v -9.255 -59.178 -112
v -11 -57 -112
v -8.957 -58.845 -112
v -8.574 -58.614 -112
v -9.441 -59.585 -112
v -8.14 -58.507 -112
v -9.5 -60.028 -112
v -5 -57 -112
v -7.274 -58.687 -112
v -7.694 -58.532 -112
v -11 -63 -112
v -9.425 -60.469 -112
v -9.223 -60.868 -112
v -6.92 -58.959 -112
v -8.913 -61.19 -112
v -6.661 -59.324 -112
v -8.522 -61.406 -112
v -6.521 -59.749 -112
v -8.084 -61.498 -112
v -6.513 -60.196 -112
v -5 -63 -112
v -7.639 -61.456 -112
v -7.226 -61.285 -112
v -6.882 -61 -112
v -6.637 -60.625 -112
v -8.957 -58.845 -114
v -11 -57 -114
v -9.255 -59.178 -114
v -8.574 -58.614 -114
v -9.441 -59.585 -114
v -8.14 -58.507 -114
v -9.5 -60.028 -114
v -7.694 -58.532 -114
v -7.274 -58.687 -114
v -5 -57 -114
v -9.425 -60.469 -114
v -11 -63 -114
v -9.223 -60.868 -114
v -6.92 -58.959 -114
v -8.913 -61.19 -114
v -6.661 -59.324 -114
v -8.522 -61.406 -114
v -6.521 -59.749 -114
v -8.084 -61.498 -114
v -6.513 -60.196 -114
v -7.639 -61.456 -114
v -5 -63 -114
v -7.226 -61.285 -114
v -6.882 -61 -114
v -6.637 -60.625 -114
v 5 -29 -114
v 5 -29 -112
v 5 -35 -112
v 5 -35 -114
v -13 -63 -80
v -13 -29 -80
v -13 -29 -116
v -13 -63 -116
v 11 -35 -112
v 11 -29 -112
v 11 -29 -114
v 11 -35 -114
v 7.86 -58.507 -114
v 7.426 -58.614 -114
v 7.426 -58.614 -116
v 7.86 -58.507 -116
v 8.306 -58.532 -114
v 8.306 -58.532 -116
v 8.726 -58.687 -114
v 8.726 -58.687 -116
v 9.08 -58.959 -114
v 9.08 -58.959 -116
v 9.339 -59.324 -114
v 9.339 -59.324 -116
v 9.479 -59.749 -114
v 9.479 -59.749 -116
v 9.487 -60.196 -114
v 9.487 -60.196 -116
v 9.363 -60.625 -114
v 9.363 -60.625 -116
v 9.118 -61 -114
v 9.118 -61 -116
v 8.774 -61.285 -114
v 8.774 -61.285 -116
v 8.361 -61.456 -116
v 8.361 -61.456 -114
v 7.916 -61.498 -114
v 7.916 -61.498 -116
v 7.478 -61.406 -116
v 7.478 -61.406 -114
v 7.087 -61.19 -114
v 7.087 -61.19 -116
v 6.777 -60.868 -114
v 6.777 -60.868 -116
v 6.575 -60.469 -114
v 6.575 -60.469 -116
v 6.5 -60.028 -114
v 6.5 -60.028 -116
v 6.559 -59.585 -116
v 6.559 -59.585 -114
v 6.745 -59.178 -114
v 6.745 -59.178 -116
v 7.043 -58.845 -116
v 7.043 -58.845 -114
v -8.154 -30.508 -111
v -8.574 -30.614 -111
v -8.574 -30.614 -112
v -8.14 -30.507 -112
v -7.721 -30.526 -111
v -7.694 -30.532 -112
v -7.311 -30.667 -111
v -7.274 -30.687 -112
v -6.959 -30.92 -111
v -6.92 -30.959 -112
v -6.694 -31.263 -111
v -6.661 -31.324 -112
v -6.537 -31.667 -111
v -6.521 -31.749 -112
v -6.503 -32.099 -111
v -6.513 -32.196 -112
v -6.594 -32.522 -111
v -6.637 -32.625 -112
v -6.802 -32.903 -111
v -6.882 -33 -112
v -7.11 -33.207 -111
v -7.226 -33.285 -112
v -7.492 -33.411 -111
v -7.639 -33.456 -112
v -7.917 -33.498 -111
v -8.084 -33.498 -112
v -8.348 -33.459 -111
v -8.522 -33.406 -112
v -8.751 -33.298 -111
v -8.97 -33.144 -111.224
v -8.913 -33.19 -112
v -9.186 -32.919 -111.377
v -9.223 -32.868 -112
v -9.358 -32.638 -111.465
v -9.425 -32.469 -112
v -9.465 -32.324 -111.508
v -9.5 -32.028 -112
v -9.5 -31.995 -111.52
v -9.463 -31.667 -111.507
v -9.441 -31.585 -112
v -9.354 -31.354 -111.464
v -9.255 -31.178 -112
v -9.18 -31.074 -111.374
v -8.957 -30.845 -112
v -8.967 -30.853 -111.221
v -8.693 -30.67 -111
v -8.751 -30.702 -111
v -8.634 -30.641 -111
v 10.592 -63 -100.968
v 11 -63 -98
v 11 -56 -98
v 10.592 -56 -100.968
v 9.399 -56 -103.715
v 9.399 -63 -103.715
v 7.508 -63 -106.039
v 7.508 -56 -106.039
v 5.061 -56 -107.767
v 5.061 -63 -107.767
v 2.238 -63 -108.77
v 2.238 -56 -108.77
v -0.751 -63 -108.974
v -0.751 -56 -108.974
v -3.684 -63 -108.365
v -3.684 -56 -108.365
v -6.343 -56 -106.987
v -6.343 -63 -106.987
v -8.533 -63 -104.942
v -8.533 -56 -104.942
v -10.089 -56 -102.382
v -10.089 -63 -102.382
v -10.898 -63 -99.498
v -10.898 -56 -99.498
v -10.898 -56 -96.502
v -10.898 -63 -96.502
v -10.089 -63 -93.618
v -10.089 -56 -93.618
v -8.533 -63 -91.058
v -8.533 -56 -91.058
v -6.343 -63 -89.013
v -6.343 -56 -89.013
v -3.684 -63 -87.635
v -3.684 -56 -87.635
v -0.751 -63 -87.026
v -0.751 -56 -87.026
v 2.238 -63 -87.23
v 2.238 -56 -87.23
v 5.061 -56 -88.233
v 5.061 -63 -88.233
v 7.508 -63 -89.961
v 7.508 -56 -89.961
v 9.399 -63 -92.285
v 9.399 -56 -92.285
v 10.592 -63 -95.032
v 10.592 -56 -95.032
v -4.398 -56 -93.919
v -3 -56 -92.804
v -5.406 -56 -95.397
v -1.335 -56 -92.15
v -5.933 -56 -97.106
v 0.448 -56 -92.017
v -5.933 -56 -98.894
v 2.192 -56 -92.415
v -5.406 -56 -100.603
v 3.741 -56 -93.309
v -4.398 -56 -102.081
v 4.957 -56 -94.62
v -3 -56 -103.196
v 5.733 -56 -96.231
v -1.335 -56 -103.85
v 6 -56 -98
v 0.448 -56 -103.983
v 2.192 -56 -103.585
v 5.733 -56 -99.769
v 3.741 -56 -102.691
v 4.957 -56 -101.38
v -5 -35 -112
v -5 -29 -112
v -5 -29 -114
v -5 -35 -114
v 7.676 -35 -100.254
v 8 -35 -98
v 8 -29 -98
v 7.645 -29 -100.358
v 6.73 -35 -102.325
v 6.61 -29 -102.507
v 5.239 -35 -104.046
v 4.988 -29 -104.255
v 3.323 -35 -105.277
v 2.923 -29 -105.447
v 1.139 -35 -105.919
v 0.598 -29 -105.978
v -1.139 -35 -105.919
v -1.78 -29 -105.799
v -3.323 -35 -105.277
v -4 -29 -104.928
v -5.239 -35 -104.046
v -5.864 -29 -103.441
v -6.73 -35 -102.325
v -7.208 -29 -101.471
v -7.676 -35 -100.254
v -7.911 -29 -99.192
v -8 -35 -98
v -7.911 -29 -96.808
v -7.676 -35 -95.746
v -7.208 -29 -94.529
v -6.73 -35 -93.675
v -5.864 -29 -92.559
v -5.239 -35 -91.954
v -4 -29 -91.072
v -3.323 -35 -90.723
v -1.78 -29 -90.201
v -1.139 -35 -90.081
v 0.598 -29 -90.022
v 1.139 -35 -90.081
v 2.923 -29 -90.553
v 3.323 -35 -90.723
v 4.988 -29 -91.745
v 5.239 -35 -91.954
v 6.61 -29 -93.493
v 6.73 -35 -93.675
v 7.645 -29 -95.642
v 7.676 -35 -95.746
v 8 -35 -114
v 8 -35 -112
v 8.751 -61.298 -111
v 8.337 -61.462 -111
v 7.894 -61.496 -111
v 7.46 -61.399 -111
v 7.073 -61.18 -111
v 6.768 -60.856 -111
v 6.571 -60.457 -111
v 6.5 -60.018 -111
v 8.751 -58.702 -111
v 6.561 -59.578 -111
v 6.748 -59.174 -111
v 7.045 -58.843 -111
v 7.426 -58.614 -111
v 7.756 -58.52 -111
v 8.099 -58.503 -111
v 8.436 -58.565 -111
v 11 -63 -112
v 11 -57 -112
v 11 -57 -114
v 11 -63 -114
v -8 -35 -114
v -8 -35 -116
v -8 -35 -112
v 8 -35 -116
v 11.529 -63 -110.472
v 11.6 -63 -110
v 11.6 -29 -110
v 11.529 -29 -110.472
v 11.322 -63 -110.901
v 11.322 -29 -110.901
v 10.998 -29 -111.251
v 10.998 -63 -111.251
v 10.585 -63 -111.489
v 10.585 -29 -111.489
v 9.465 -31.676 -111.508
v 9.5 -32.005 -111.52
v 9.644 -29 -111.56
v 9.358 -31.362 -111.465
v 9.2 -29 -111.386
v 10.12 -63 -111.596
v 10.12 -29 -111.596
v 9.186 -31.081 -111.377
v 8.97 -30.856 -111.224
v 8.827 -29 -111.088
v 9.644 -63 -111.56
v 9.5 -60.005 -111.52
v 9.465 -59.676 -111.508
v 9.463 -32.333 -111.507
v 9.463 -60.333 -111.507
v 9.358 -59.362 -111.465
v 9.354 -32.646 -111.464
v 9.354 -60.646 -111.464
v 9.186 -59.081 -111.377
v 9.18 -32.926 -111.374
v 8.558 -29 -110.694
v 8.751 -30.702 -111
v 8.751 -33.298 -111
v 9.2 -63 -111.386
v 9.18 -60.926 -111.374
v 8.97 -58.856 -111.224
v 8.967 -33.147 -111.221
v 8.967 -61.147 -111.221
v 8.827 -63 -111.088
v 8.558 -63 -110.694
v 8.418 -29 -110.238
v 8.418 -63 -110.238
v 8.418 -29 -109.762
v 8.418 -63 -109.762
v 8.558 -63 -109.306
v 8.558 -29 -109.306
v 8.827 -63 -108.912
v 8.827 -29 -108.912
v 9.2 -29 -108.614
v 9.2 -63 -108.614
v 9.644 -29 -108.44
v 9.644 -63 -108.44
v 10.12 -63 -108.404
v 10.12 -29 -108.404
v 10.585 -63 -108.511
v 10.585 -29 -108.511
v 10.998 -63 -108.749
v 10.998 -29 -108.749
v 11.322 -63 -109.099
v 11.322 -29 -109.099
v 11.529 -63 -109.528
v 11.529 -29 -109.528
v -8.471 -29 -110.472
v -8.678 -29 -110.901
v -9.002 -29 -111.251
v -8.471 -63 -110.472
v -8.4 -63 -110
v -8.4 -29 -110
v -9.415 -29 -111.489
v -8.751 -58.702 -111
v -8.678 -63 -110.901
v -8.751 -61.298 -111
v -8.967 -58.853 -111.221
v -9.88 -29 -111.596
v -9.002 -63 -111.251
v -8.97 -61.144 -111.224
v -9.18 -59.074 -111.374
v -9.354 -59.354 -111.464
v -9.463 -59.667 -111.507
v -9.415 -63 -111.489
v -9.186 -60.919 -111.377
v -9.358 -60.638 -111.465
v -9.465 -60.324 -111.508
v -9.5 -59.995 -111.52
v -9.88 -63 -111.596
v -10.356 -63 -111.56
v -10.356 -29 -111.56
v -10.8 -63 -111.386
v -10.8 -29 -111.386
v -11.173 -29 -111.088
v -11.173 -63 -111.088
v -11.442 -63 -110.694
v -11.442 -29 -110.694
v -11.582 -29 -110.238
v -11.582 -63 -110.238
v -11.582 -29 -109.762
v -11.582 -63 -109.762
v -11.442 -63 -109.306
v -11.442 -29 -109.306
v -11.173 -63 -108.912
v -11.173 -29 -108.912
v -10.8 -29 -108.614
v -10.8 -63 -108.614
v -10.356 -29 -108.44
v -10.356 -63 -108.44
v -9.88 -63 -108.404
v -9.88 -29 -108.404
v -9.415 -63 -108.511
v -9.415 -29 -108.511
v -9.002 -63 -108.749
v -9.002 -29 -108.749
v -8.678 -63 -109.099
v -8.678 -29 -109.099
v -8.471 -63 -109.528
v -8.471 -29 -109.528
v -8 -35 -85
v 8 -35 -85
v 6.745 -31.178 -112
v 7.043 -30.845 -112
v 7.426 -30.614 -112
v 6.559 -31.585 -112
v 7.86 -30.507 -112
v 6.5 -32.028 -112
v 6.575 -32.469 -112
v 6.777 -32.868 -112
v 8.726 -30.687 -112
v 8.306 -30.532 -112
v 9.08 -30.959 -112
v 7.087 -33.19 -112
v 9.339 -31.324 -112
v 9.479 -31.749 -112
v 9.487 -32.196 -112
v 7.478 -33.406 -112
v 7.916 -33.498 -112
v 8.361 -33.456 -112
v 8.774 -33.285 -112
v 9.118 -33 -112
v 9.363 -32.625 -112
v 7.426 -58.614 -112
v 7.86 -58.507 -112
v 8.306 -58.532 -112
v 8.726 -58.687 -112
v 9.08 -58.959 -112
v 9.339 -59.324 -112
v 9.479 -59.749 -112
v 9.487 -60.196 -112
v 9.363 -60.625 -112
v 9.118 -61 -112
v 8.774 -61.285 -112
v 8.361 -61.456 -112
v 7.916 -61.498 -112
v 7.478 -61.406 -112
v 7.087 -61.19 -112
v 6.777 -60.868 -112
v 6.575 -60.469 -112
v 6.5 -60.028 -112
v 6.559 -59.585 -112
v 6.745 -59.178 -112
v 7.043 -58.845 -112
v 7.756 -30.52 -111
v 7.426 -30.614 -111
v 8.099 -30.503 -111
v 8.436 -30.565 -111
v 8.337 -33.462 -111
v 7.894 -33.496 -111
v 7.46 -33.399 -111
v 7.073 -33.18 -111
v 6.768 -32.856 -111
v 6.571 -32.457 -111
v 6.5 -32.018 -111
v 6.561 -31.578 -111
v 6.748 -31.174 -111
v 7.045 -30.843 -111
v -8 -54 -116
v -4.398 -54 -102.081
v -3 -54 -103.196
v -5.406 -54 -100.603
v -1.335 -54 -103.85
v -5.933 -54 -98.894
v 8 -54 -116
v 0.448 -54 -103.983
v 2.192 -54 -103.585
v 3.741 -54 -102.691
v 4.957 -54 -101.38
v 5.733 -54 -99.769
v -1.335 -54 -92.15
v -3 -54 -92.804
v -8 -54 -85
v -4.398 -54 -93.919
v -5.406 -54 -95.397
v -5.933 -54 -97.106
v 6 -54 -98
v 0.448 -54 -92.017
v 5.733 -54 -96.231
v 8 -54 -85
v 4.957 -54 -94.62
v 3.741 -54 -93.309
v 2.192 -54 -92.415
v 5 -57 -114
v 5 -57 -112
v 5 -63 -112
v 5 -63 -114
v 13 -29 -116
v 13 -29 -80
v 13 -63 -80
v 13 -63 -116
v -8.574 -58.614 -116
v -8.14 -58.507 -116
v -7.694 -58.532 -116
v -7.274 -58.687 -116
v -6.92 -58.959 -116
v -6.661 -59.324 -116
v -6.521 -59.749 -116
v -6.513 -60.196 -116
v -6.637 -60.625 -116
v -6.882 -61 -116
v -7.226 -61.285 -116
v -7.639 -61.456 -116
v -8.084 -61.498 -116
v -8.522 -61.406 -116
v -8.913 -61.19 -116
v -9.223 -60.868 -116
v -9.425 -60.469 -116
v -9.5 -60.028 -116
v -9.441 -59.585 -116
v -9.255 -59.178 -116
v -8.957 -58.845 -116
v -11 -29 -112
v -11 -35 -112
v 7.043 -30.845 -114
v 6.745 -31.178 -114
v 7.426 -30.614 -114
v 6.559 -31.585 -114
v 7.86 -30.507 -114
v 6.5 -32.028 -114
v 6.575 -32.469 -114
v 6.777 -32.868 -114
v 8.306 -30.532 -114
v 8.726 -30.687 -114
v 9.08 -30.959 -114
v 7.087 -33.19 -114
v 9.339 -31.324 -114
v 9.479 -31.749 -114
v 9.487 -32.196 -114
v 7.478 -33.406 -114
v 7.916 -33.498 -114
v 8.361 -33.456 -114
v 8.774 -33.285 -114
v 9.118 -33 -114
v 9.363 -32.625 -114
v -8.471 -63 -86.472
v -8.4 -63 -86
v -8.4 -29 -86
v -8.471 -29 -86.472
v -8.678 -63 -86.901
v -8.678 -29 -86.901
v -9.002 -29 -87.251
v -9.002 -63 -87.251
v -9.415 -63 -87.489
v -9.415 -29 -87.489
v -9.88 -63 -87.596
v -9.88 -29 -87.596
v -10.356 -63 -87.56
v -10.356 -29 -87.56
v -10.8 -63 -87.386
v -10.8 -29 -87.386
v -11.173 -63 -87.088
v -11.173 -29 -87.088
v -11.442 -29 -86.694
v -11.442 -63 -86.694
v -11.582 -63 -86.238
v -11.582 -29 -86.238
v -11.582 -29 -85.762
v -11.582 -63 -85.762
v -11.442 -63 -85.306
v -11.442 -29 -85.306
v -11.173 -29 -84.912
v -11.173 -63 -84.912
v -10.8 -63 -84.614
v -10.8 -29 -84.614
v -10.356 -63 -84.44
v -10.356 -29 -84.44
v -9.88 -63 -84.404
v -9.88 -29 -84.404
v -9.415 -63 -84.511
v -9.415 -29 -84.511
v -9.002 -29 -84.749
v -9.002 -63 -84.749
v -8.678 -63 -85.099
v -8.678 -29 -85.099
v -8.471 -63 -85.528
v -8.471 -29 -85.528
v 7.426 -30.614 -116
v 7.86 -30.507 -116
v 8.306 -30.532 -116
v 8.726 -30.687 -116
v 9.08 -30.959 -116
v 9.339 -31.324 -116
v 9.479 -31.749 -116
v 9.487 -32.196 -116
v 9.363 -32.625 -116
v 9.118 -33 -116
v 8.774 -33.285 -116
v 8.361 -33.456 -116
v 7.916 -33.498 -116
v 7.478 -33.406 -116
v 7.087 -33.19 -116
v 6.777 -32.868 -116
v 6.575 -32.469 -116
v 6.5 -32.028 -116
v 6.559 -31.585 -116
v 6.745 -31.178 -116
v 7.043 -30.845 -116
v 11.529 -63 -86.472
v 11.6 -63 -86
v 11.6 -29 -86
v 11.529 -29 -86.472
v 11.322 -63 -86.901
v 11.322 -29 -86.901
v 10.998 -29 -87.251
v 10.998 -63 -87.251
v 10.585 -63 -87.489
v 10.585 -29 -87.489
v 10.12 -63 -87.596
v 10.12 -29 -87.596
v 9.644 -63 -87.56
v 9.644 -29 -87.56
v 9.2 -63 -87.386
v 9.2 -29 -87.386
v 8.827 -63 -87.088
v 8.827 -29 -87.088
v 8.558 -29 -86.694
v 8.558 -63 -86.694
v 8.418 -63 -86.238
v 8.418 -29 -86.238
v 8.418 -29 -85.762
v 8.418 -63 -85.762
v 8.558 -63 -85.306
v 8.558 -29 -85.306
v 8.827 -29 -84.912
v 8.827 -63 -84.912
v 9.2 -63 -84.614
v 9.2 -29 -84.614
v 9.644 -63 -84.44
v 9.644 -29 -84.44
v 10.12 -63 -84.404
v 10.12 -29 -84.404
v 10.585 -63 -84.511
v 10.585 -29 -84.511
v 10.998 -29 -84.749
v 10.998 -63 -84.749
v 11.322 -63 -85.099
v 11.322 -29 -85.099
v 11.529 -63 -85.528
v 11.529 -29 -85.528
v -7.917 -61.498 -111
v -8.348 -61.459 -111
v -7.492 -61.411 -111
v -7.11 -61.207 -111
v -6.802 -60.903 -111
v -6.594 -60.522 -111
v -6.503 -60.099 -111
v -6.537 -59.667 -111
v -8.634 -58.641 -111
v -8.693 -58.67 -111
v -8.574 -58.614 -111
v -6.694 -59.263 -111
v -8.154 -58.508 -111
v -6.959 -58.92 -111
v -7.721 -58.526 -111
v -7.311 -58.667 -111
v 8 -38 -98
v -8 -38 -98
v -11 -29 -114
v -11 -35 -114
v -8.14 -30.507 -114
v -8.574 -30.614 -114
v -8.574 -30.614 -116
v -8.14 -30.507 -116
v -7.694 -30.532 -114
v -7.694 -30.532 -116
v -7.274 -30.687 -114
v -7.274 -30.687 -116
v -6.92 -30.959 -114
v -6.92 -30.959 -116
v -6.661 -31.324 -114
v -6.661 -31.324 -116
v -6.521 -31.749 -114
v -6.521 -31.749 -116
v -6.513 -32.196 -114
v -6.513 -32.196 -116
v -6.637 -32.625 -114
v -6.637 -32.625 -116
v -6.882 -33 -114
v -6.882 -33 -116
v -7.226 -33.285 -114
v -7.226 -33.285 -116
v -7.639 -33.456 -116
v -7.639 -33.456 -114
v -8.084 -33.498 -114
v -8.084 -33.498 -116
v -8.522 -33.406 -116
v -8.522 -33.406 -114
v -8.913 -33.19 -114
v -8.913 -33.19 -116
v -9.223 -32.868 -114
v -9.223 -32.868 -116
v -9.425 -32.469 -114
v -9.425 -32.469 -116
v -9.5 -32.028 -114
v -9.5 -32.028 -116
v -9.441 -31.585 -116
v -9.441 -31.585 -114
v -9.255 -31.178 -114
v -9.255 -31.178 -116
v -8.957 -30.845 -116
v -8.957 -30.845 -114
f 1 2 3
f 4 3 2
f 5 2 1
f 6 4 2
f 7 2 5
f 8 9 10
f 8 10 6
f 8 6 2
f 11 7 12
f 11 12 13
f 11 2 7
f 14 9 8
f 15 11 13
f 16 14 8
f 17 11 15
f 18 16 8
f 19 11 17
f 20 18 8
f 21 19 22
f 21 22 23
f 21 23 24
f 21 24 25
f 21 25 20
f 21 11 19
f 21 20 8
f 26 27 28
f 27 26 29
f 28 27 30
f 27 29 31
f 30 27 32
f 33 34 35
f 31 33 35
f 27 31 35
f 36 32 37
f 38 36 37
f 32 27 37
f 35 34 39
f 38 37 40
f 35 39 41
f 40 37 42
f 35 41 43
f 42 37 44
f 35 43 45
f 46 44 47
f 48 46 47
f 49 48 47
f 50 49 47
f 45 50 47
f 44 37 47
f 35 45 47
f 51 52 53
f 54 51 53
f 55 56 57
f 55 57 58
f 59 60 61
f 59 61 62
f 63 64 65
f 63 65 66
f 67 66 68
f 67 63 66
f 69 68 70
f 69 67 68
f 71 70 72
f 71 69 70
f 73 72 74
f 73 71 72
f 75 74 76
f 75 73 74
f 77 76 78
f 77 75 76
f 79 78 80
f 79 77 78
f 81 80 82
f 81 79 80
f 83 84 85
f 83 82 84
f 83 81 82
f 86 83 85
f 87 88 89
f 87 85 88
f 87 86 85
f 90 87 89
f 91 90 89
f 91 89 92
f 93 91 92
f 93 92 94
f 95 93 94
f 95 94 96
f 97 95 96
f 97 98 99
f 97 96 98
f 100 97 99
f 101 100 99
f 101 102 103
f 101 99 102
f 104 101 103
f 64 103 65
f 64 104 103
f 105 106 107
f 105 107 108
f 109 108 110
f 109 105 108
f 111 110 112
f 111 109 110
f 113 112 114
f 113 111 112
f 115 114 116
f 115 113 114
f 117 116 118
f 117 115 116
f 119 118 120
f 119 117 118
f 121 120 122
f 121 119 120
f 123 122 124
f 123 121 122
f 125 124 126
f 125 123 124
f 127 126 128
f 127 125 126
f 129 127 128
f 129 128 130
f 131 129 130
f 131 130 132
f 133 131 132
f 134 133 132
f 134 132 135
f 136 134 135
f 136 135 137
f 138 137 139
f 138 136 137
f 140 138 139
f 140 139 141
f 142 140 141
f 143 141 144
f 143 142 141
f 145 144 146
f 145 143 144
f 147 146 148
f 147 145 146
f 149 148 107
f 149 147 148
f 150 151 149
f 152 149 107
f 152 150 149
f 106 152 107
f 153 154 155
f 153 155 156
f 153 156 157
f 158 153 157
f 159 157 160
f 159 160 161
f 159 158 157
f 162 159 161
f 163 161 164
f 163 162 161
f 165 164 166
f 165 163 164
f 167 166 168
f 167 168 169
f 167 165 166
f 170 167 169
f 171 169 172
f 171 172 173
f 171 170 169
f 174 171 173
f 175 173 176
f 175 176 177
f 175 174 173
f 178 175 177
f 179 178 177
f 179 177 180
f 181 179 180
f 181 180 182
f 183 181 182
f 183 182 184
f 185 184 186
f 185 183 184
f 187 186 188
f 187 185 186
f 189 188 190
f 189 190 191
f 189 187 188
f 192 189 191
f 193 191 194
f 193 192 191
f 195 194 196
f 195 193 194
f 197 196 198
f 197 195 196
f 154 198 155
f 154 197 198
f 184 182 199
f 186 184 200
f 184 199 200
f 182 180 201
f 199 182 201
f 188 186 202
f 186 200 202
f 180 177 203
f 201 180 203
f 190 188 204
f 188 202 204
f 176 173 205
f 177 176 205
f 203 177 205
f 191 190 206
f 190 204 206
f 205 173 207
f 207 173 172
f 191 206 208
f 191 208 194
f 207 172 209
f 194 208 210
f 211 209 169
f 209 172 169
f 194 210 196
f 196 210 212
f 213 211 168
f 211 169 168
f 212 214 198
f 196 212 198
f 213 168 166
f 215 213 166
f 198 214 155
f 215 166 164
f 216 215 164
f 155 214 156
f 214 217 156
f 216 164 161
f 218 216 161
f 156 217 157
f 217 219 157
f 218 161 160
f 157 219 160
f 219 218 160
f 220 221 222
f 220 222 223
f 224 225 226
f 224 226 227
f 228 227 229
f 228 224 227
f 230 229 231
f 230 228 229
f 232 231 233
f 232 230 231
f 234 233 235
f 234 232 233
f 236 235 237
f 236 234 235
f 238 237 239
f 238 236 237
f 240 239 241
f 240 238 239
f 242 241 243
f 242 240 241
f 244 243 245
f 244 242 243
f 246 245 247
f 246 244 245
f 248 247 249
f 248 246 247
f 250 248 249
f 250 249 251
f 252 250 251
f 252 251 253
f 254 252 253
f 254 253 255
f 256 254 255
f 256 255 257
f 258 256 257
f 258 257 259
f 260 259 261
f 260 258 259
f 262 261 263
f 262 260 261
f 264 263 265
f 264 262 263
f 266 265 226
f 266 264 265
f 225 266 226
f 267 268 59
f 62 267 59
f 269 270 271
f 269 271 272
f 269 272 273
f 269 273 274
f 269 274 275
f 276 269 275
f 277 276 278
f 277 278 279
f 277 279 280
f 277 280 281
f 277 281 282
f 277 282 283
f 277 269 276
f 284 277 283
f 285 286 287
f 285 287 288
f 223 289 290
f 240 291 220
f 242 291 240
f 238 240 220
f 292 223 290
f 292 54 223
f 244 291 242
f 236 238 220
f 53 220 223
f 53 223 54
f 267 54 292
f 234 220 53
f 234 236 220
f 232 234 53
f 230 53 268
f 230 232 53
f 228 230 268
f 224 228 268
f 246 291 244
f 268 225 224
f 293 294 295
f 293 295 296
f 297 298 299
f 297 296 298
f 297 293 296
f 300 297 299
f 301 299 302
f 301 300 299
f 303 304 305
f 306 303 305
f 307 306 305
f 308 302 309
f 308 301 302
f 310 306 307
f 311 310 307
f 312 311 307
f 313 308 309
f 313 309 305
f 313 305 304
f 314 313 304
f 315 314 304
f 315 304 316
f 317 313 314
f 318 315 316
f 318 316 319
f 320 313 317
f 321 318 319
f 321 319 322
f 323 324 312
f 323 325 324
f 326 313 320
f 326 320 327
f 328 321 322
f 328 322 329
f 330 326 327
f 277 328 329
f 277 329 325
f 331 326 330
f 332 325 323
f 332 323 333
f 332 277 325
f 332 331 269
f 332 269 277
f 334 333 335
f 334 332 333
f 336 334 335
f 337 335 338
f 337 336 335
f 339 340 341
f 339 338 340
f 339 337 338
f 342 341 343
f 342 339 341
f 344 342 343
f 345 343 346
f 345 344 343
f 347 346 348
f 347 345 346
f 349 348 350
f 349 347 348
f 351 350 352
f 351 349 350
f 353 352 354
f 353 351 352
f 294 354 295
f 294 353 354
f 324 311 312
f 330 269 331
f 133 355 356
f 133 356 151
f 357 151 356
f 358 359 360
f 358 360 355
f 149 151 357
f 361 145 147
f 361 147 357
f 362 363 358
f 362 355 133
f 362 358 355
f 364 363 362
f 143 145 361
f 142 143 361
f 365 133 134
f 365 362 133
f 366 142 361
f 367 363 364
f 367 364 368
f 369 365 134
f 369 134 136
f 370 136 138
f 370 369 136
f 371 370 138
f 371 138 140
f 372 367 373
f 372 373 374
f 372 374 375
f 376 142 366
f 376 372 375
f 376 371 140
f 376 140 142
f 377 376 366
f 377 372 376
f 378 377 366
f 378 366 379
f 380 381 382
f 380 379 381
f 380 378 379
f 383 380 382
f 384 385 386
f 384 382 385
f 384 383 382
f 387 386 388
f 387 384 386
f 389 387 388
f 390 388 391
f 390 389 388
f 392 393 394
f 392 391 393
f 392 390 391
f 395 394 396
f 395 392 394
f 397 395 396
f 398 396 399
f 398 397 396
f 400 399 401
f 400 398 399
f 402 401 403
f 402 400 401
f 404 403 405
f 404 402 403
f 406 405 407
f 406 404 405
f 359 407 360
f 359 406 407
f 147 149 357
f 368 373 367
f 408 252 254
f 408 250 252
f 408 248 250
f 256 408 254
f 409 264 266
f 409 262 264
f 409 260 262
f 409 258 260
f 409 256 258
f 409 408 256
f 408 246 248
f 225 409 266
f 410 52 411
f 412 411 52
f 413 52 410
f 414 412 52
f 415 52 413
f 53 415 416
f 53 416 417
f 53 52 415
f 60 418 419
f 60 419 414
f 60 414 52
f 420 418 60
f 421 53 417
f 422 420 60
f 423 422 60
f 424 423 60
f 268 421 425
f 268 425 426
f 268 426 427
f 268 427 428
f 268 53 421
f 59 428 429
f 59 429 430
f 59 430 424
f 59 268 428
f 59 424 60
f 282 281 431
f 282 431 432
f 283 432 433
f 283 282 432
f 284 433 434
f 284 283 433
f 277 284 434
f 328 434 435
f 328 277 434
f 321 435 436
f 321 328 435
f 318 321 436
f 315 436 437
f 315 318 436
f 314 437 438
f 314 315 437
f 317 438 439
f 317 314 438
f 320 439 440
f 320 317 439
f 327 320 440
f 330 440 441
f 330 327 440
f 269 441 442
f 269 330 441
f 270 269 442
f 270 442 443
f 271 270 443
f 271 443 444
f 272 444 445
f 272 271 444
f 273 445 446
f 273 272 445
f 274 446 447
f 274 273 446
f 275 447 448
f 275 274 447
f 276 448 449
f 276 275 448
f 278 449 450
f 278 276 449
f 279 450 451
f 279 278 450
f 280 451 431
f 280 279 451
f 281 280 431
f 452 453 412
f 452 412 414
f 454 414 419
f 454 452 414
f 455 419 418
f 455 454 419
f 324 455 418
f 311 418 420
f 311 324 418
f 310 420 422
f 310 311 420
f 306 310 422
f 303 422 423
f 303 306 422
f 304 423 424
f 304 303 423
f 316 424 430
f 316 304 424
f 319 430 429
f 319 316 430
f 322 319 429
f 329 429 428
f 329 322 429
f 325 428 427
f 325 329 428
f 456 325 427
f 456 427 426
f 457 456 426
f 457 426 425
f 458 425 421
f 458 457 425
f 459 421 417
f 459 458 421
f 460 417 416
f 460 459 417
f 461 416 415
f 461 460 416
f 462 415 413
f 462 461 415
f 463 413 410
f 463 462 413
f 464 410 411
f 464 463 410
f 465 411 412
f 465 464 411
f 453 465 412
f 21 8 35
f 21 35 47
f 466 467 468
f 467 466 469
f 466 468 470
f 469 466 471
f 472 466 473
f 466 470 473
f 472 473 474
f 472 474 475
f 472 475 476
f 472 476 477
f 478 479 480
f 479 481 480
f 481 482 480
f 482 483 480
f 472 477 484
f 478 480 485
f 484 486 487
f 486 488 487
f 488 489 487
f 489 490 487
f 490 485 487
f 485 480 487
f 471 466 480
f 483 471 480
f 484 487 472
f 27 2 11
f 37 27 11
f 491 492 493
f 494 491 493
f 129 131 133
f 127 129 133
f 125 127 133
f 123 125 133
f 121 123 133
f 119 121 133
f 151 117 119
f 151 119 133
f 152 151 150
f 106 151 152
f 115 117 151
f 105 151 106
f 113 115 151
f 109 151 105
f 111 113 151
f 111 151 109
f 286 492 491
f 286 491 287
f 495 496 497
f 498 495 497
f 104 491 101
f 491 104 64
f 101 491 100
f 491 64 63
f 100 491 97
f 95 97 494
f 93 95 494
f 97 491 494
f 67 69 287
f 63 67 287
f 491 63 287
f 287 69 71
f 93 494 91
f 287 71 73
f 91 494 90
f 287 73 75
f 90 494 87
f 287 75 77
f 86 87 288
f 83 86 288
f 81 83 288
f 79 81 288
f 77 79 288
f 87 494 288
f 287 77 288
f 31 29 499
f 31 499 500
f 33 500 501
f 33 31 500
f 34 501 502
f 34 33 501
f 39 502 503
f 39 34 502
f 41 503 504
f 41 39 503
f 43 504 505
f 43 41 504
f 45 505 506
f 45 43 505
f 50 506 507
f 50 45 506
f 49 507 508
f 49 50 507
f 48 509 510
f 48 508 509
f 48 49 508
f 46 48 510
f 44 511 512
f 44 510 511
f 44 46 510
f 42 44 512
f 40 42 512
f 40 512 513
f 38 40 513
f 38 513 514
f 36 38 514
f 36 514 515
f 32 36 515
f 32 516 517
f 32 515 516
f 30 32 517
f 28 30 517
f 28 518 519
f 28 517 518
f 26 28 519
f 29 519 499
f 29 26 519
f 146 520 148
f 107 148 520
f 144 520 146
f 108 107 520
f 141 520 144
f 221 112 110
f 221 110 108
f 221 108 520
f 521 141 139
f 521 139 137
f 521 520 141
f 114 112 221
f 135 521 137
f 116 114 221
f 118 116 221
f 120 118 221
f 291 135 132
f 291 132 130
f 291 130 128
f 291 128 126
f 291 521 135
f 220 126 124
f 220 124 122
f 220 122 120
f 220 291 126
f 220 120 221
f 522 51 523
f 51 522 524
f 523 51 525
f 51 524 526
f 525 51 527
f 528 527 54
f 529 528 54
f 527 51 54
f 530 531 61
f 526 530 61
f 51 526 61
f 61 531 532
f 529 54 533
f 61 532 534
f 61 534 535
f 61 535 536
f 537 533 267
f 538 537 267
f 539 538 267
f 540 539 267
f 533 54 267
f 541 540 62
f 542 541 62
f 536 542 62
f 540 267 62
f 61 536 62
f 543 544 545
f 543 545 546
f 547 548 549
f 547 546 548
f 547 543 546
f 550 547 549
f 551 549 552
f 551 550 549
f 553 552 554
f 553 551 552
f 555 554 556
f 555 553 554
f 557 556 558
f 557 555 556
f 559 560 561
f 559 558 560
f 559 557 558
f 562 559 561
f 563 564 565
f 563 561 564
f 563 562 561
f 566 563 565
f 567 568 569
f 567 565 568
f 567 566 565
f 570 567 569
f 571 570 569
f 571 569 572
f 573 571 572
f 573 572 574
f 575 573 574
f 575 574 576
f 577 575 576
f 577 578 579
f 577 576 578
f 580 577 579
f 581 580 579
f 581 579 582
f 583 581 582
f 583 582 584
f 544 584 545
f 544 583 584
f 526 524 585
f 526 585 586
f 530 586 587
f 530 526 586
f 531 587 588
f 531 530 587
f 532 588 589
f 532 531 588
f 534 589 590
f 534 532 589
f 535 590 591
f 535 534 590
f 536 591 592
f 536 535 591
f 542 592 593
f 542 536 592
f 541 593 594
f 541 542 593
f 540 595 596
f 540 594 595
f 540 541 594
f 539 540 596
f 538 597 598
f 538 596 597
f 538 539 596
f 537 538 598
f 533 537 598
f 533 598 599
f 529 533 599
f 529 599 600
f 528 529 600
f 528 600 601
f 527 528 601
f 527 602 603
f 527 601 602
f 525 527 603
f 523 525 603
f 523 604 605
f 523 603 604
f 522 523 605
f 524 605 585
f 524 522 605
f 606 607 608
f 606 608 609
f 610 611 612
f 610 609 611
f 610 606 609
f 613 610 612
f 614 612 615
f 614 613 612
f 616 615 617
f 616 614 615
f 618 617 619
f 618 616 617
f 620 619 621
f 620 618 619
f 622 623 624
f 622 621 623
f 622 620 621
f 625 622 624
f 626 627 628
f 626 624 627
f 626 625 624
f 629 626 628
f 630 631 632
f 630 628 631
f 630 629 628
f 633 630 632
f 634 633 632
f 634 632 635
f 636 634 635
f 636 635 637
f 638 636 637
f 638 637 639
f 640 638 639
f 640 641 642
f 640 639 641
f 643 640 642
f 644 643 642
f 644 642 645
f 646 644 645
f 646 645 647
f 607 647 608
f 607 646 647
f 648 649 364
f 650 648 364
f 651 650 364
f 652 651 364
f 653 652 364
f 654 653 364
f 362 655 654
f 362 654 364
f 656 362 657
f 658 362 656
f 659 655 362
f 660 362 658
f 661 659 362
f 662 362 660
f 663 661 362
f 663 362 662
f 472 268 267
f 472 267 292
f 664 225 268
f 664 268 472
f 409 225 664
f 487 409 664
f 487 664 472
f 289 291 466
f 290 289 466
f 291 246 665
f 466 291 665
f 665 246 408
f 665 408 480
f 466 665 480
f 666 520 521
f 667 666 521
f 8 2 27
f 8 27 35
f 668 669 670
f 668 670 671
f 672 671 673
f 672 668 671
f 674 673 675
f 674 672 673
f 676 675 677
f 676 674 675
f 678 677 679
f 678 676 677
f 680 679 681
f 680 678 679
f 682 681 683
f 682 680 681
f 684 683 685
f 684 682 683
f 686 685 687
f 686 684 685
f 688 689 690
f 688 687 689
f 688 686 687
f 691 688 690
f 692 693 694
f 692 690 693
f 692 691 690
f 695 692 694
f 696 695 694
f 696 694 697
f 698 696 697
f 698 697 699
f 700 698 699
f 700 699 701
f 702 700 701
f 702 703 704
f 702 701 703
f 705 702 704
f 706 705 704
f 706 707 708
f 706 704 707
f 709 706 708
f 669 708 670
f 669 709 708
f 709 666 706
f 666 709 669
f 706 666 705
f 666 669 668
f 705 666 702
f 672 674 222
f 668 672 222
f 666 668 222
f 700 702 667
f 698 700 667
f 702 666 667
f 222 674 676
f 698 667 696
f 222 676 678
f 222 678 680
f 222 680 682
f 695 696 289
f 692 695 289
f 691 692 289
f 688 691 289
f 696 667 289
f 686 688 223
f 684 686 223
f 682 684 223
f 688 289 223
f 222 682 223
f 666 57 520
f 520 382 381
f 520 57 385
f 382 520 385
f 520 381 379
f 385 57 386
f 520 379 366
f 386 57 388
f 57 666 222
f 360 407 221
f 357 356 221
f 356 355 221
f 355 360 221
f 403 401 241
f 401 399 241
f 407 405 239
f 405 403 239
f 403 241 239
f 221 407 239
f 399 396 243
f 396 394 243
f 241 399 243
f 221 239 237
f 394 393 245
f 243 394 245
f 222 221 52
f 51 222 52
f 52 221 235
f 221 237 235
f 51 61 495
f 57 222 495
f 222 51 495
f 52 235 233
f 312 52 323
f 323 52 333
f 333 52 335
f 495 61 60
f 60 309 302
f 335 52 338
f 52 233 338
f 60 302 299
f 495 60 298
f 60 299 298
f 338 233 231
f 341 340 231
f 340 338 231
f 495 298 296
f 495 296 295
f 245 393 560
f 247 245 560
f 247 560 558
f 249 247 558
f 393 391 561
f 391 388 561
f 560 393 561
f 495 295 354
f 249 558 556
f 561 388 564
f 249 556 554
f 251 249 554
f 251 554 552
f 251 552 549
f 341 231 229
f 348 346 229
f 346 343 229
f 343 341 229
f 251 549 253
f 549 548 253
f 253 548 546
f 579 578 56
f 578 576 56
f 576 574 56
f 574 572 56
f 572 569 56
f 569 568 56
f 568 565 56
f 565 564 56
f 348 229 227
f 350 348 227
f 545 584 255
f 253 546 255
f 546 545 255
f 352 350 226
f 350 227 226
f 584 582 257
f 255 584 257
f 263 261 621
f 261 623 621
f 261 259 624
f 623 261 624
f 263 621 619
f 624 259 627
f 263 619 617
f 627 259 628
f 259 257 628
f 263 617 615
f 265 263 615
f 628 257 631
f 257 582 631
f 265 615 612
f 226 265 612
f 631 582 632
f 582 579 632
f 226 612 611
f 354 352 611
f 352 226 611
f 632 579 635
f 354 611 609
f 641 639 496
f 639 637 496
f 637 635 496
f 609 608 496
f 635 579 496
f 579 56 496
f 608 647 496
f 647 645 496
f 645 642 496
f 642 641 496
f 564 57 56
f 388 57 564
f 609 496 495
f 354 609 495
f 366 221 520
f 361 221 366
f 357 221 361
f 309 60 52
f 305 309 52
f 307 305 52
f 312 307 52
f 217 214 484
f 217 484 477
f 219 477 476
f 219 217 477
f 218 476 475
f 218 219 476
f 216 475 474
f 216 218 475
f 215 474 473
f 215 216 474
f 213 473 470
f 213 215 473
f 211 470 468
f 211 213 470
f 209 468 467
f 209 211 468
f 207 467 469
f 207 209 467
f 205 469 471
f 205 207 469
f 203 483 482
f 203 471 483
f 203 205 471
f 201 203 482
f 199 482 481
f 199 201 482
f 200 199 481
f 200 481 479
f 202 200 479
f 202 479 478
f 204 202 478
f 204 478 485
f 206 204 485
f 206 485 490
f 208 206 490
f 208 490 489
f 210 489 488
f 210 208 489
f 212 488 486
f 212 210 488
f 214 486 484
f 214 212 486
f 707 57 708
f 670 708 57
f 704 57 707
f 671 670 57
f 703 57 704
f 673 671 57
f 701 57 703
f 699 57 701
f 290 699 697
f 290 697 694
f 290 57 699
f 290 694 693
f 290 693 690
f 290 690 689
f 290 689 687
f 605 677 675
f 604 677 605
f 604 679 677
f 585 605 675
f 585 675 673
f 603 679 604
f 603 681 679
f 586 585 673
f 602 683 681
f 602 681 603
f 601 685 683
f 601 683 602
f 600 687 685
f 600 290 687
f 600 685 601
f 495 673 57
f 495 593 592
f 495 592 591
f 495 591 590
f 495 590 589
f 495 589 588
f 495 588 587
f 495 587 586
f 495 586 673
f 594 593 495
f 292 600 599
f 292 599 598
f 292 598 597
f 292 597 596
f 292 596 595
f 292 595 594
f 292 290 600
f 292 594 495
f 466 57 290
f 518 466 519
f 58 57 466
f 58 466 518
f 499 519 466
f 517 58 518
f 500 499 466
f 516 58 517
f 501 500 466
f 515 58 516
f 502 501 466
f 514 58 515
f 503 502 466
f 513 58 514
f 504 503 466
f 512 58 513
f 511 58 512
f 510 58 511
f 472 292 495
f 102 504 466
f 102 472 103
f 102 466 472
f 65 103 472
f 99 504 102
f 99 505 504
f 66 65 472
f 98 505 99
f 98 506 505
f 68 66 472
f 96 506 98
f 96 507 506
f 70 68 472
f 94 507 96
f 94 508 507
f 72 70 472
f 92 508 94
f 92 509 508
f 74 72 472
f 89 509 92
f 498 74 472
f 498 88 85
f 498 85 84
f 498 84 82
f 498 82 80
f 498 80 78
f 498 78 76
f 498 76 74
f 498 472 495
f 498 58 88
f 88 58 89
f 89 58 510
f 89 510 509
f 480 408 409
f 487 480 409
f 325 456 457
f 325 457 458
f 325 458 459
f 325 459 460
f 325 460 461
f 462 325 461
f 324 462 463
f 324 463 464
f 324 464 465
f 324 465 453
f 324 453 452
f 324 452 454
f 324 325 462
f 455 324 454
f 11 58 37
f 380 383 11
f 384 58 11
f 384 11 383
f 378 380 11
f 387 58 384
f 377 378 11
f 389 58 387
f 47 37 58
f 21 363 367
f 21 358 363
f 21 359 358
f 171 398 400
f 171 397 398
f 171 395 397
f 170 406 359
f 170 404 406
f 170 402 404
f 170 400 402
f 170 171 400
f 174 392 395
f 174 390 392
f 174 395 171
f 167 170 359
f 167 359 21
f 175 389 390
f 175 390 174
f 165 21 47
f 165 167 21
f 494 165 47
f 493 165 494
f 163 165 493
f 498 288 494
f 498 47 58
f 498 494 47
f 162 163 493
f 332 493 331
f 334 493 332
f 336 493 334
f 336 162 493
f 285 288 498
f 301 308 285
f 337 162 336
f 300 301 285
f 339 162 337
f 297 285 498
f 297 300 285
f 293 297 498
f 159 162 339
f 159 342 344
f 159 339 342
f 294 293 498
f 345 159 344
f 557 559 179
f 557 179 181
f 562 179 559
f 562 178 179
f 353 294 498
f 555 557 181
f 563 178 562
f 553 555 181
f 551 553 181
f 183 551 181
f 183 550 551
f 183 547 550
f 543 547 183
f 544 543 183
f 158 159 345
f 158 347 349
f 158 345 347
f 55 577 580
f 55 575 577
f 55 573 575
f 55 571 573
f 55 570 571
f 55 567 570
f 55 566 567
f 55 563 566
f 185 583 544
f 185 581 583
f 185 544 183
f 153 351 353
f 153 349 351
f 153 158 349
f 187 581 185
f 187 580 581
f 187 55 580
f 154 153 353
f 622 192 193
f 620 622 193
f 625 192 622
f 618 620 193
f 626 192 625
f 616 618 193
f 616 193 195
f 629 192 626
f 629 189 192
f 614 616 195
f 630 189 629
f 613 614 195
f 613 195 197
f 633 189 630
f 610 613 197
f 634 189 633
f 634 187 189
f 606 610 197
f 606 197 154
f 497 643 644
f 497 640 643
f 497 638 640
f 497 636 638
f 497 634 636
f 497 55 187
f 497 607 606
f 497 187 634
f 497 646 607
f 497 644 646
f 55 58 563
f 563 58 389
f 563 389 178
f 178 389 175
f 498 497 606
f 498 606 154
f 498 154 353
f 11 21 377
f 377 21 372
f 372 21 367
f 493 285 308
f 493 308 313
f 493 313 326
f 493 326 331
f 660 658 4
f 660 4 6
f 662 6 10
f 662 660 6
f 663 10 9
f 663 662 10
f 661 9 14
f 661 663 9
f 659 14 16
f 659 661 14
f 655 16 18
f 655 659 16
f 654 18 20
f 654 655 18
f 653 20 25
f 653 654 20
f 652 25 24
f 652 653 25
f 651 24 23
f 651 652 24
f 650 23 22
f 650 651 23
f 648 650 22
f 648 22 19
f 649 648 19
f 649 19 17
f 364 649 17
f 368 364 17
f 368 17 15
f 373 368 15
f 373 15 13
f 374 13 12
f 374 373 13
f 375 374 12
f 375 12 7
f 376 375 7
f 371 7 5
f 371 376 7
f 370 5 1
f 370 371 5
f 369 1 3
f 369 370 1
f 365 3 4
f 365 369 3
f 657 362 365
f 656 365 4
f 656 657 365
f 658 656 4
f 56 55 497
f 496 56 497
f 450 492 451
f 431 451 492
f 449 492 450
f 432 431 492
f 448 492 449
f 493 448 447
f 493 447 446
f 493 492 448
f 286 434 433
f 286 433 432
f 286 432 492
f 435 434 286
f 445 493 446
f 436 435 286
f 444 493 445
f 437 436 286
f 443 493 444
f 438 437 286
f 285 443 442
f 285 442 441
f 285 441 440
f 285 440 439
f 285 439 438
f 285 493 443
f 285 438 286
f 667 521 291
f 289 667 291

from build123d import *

# Parameters (mm, degrees)
CYLINDER541_R               = 1.5
CYLINDER541_DEPTH           = 20
CYLINDER541_PLACEMENT_ANGLE = -112.5
CYLINDER542_R               = 1.5
CYLINDER542_DEPTH           = 20
CYLINDER542_PLACEMENT_ANGLE = 112.5
CYLINDER543_R               = 1.5
CYLINDER543_DEPTH           = 20
CYLINDER543_PLACEMENT_ANGLE = 112.5
CYLINDER540_R               = 1.5
CYLINDER540_DEPTH           = 20
CYLINDER540_PLACEMENT_ANGLE = -112.5
BOX742_W                    = 6
BOX742_H                    = 6
BOX742_DEPTH                = 2
BOX743_W                    = 6
BOX743_H                    = 6
BOX743_DEPTH                = 2
BOX744_W                    = 6
BOX744_H                    = 6
BOX744_DEPTH                = 2
BOX741_W                    = 6
BOX741_H                    = 6
BOX741_DEPTH                = 2
CYLINDER538_R               = 3
CYLINDER538_DEPTH           = 3
CYLINDER537_R               = 3
CYLINDER537_DEPTH           = 3
CYLINDER536_R               = 3
CYLINDER536_DEPTH           = 3
CYLINDER539_R               = 3
CYLINDER539_DEPTH           = 3
CYLINDER535_R               = 1.6
CYLINDER535_DEPTH           = 80
CYLINDER533_R               = 1.6
CYLINDER533_DEPTH           = 80
CYLINDER534_R               = 1.6
CYLINDER534_DEPTH           = 80
CYLINDER532_R               = 1.6
CYLINDER532_DEPTH           = 80
CYLINDER531_R               = 6
CYLINDER531_DEPTH           = 20
CYLINDER530_R               = 11
CYLINDER530_DEPTH           = 7
CYLINDER529_R               = 8
CYLINDER529_DEPTH           = 20
BOX740_W                    = 16
BOX740_H                    = 19
BOX740_DEPTH                = 50
BOX739_W                    = 26
BOX739_H                    = 34
BOX739_DEPTH                = 36
CUT681_PLACEMENT_ANGLE      = 180


with BuildPart() as v_lec541:
    # Cylinder541 → Cylinder541 (new body)
    with BuildSketch(Plane.XY):
        Circle(CYLINDER541_R)
    extrude(amount=CYLINDER541_DEPTH)


with BuildPart() as v_lec541_1:
    # Cylinder541 placement: moved
    add(v_lec541.part.moved(Location((-8, 34, 51))).rotate(Axis((-8, 34, 51), (0, 0, 1)), CYLINDER541_PLACEMENT_ANGLE))


with BuildPart() as v_lec542:
    # Cylinder542 → Cylinder542 (new body)
    with BuildSketch(Plane.XY):
        Circle(CYLINDER542_R)
    extrude(amount=CYLINDER542_DEPTH)


with BuildPart() as v_lec542_1:
    # Cylinder542 placement: moved
    add(v_lec542.part.moved(Location((8, 62, 51))).rotate(Axis((8, 62, 51), (0, 0, -1)), CYLINDER542_PLACEMENT_ANGLE))


with BuildPart() as v_lec543:
    # Cylinder543 → Cylinder543 (new body)
    with BuildSketch(Plane.XY):
        Circle(CYLINDER543_R)
    extrude(amount=CYLINDER543_DEPTH)


with BuildPart() as v_lec543_1:
    # Cylinder543 placement: moved
    add(v_lec543.part.moved(Location((-8, 62, 51))).rotate(Axis((-8, 62, 51), (0, 0, -1)), CYLINDER543_PLACEMENT_ANGLE))


with BuildPart() as compound423:
    # Cylinder540 → Cylinder540 (new body)
    with BuildSketch(Plane.XY):
        Circle(CYLINDER540_R)
    extrude(amount=CYLINDER540_DEPTH)


with BuildPart() as compound423_1:
    # Cylinder540 placement: moved
    add(compound423.part.moved(Location((8, 34, 51))).rotate(Axis((8, 34, 51), (0, 0, 1)), CYLINDER540_PLACEMENT_ANGLE))

    # Compound423: union Válec541, Válec542, Válec543
    add(v_lec541_1.part)
    add(v_lec542_1.part)
    add(v_lec543_1.part)


with BuildPart() as compound423_2:
    # Compound423 placement: moved
    add(compound423_1.part.moved(Location((0, 0, 5))))


with BuildPart() as krychle741:
    # Box742 → Box742 (new body)
    with BuildSketch(Plane(origin=(5, 59, 53), x_dir=(1, 0, 0), z_dir=(0, 0, 1))):
        with Locations((3, 3)):
            Rectangle(BOX742_W, BOX742_H)
    extrude(amount=BOX742_DEPTH)


with BuildPart() as krychle742:
    # Box743 → Box743 (new body)
    with BuildSketch(Plane(origin=(5, 31, 53), x_dir=(1, 0, 0), z_dir=(0, 0, 1))):
        with Locations((3, 3)):
            Rectangle(BOX743_W, BOX743_H)
    extrude(amount=BOX743_DEPTH)


with BuildPart() as krychle743:
    # Box744 → Box744 (new body)
    with BuildSketch(Plane(origin=(-11, 31, 53), x_dir=(1, 0, 0), z_dir=(0, 0, 1))):
        with Locations((3, 3)):
            Rectangle(BOX744_W, BOX744_H)
    extrude(amount=BOX744_DEPTH)


with BuildPart() as compound422:
    # Box741 → Box741 (new body)
    with BuildSketch(Plane(origin=(-11, 59, 53), x_dir=(1, 0, 0), z_dir=(0, 0, 1))):
        with Locations((3, 3)):
            Rectangle(BOX741_W, BOX741_H)
    extrude(amount=BOX741_DEPTH)

    # Compound422: union Krychle741, Krychle742, Krychle743
    add(krychle741.part)
    add(krychle742.part)
    add(krychle743.part)


with BuildPart() as compound422_1:
    # Compound422 placement: moved
    add(compound422.part.moved(Location((0, 0, 4))))


with BuildPart() as v_lec538:
    # Cylinder538 → Cylinder538 (new body)
    with BuildSketch(Plane(origin=(-10, 80, 31), x_dir=(1, 0, 0), z_dir=(0, -1, 0))):
        Circle(CYLINDER538_R)
    extrude(amount=CYLINDER538_DEPTH)


with BuildPart() as v_lec537:
    # Cylinder537 → Cylinder537 (new body)
    with BuildSketch(Plane(origin=(10, 80, 55), x_dir=(1, 0, 0), z_dir=(0, -1, 0))):
        Circle(CYLINDER537_R)
    extrude(amount=CYLINDER537_DEPTH)


with BuildPart() as v_lec536:
    # Cylinder536 → Cylinder536 (new body)
    with BuildSketch(Plane(origin=(10, 80, 31), x_dir=(1, 0, 0), z_dir=(0, -1, 0))):
        Circle(CYLINDER536_R)
    extrude(amount=CYLINDER536_DEPTH)


with BuildPart() as compound421:
    # Cylinder539 → Cylinder539 (new body)
    with BuildSketch(Plane(origin=(-10, 80, 55), x_dir=(1, 0, 0), z_dir=(0, -1, 0))):
        Circle(CYLINDER539_R)
    extrude(amount=CYLINDER539_DEPTH)

    # Compound421: union Válec538, Válec537, Válec536
    add(v_lec538.part)
    add(v_lec537.part)
    add(v_lec536.part)


with BuildPart() as compound421_1:
    # Compound421 placement: moved
    add(compound421.part.moved(Location((0, -8, 0))))


with BuildPart() as v_lec535:
    # Cylinder535 → Cylinder535 (new body)
    with BuildSketch(Plane(origin=(-10, 80, 31), x_dir=(1, 0, 0), z_dir=(0, -1, 0))):
        Circle(CYLINDER535_R)
    extrude(amount=CYLINDER535_DEPTH)


with BuildPart() as v_lec533:
    # Cylinder533 → Cylinder533 (new body)
    with BuildSketch(Plane(origin=(10, 80, 55), x_dir=(1, 0, 0), z_dir=(0, -1, 0))):
        Circle(CYLINDER533_R)
    extrude(amount=CYLINDER533_DEPTH)


with BuildPart() as v_lec534:
    # Cylinder534 → Cylinder534 (new body)
    with BuildSketch(Plane(origin=(10, 80, 31), x_dir=(1, 0, 0), z_dir=(0, -1, 0))):
        Circle(CYLINDER534_R)
    extrude(amount=CYLINDER534_DEPTH)


with BuildPart() as compound420:
    # Cylinder532 → Cylinder532 (new body)
    with BuildSketch(Plane(origin=(-10, 80, 55), x_dir=(1, 0, 0), z_dir=(0, -1, 0))):
        Circle(CYLINDER532_R)
    extrude(amount=CYLINDER532_DEPTH)

    # Compound420: union Válec535, Válec533, Válec534
    add(v_lec535.part)
    add(v_lec533.part)
    add(v_lec534.part)


with BuildPart() as v_lec531:
    # Cylinder531 → Cylinder531 (new body)
    with BuildSketch(Plane(origin=(0, 73, 43), x_dir=(1, 0, 0), z_dir=(0, -1, 0))):
        Circle(CYLINDER531_R)
    extrude(amount=CYLINDER531_DEPTH)


with BuildPart() as v_lec530:
    # Cylinder530 → Cylinder530 (new body)
    with BuildSketch(Plane(origin=(0, 65, 43), x_dir=(1, 0, 0), z_dir=(0, -1, 0))):
        Circle(CYLINDER530_R)
    extrude(amount=CYLINDER530_DEPTH)


with BuildPart() as v_lec529:
    # Cylinder529 → Cylinder529 (new body)
    with BuildSketch(Plane(origin=(0, 40, 43), x_dir=(1, 0, 0), z_dir=(0, -1, 0))):
        Circle(CYLINDER529_R)
    extrude(amount=CYLINDER529_DEPTH)


with BuildPart() as krychle739:
    # Box740 → Box740 (new body)
    with BuildSketch(Plane(origin=(-8, 37, 30), x_dir=(1, 0, 0), z_dir=(0, 0, 1))):
        with Locations((8, 9.5)):
            Rectangle(BOX740_W, BOX740_H)
    extrude(amount=BOX740_DEPTH)


with BuildPart() as t_mini_small_box:
    # Box739 → Box739 (new body)
    with BuildSketch(Plane(origin=(-13, 31, 25), x_dir=(1, 0, 0), z_dir=(0, 0, 1))):
        with Locations((13, 17)):
            Rectangle(BOX739_W, BOX739_H)
    extrude(amount=BOX739_DEPTH)

    # Cut675: cut Krychle739
    add(krychle739.part, mode=Mode.SUBTRACT)

    # Cut076: cut Válec529
    add(v_lec529.part, mode=Mode.SUBTRACT)

    # Cut676: cut Válec530
    add(v_lec530.part, mode=Mode.SUBTRACT)

    # Cut677: cut Válec531
    add(v_lec531.part, mode=Mode.SUBTRACT)

    # Cut678: cut Compound420
    add(compound420.part, mode=Mode.SUBTRACT)

    # Cut679: cut Compound421
    add(compound421_1.part, mode=Mode.SUBTRACT)

    # Cut680: cut Compound422
    add(compound422_1.part, mode=Mode.SUBTRACT)

    # Cut681: cut Compound423
    add(compound423_2.part, mode=Mode.SUBTRACT)


with BuildPart() as t_mini_small_box_1:
    # Cut681 placement: moved
    add(t_mini_small_box.part.moved(Location((0, 2, -55))).rotate(Axis((0, 2, -55), (1, 0, 0)), CUT681_PLACEMENT_ANGLE))


solid = t_mini_small_box_1.part
